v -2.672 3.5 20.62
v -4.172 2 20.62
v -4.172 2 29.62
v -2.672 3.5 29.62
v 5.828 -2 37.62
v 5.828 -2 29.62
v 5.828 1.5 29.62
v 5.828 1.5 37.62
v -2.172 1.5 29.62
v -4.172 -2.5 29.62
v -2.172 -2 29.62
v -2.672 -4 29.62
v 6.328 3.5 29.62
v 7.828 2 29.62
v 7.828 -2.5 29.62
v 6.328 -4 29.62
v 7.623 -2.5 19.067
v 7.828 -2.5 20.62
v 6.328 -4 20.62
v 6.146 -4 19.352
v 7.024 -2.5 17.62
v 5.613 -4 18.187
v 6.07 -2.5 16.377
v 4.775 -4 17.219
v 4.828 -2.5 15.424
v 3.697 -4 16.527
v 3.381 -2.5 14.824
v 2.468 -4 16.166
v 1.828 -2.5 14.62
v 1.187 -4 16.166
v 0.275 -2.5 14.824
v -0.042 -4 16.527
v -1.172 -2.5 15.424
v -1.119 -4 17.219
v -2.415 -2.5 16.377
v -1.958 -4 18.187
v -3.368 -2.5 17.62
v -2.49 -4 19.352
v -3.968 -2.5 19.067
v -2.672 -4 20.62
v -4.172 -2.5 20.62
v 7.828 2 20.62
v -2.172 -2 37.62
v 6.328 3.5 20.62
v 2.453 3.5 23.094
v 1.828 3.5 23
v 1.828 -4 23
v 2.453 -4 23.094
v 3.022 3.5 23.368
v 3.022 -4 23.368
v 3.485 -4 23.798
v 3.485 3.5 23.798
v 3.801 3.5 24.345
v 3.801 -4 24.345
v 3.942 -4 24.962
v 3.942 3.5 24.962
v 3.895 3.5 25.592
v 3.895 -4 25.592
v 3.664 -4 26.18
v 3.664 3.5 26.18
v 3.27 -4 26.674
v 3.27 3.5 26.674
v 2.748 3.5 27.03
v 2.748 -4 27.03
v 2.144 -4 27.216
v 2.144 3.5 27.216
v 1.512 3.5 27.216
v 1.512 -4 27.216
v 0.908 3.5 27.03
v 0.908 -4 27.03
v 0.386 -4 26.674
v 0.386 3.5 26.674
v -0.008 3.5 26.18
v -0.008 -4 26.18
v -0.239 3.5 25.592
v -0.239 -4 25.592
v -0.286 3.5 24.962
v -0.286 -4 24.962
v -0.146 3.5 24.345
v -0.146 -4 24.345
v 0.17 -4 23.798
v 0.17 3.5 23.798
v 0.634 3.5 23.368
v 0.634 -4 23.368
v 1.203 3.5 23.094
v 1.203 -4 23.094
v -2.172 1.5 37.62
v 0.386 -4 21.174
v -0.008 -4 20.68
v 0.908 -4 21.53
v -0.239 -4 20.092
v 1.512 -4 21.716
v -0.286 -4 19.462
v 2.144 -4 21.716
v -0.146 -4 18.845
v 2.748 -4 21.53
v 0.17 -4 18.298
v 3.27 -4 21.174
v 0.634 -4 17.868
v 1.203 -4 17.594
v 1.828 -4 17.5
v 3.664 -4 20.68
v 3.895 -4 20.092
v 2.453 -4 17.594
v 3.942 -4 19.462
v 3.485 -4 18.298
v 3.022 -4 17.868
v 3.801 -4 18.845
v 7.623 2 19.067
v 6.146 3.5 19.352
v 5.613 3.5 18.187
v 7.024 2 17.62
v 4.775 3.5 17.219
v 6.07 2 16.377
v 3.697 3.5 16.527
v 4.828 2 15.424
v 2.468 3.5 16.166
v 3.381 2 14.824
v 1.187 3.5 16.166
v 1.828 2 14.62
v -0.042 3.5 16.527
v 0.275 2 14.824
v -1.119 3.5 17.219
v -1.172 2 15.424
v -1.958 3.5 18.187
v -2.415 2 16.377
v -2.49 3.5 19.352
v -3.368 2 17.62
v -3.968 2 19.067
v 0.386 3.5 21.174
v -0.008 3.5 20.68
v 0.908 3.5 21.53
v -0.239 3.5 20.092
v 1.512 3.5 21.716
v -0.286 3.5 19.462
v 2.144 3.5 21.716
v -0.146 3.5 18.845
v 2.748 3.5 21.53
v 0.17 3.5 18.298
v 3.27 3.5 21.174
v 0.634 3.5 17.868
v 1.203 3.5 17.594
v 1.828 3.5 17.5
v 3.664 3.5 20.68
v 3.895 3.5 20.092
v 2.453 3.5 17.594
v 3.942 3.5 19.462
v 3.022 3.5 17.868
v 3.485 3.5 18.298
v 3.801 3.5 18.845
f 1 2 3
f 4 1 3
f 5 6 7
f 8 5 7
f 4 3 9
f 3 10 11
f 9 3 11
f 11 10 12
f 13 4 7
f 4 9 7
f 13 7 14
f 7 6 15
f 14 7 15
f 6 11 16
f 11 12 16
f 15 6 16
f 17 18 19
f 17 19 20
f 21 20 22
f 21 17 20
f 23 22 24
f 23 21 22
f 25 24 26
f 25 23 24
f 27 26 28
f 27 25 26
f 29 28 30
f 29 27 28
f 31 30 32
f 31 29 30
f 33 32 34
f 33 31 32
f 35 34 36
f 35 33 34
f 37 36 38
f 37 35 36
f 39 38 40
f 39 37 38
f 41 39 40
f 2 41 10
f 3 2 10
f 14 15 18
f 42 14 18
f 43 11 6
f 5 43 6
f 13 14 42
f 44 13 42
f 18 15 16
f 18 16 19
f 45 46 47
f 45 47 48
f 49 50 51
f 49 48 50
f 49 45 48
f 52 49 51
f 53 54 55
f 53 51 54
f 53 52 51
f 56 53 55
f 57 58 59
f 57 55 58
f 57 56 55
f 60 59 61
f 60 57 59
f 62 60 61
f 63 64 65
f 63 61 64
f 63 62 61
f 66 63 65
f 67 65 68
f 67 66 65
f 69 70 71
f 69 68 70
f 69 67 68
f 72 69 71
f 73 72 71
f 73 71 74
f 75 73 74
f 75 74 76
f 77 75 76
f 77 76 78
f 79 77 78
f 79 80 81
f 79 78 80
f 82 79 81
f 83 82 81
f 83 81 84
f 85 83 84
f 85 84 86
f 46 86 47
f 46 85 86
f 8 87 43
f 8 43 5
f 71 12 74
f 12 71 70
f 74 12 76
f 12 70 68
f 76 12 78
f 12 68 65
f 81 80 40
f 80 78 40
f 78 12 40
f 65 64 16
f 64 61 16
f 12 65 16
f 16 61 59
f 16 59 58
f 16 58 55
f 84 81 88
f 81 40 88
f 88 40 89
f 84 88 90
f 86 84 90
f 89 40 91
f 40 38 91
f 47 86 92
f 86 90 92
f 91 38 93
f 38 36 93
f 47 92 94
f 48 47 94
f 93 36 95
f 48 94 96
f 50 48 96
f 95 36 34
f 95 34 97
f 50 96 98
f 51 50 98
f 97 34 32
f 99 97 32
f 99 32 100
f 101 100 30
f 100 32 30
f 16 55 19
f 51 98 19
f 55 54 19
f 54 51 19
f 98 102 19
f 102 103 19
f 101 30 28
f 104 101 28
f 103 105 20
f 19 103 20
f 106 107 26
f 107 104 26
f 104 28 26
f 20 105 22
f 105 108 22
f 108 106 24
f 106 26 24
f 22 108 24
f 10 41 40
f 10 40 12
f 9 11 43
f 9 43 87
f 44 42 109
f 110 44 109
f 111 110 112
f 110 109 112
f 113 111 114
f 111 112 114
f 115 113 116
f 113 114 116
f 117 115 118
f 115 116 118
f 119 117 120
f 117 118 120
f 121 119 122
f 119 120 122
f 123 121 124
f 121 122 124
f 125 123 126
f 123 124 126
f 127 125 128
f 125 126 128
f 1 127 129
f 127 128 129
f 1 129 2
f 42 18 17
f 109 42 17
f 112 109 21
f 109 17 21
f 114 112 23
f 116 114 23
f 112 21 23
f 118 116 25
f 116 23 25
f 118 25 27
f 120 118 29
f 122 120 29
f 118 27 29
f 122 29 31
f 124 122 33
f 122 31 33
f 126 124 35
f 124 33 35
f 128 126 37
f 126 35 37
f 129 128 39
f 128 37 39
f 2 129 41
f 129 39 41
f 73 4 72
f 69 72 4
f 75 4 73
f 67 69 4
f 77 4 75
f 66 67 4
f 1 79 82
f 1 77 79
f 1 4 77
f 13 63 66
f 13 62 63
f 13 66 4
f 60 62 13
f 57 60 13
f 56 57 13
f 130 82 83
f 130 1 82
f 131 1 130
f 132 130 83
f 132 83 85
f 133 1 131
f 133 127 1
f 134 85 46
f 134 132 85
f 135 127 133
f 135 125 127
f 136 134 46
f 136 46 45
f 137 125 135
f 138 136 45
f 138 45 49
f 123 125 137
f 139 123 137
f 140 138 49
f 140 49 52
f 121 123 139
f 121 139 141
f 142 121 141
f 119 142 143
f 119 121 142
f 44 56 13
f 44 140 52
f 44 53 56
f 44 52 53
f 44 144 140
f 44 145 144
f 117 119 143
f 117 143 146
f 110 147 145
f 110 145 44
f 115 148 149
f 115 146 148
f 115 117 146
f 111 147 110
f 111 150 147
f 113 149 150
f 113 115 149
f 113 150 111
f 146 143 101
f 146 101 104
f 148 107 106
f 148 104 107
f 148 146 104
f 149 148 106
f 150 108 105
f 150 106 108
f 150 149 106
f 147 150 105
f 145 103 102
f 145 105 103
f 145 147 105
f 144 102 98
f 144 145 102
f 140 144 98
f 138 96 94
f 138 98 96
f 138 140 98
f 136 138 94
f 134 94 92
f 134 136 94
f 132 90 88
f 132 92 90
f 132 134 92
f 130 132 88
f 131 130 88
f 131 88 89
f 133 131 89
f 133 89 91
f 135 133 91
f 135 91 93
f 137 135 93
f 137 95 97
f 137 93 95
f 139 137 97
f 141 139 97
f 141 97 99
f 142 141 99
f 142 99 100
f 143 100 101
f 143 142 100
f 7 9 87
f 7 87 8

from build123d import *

# Parameters (mm, degrees)
BOSS_EXTRUDE9_DEPTH      = 3.5
BOSS_EXTRUDE9_DEPTH_BACK = 4
SKETCH16_W               = 8
SKETCH16_H               = 3.5
BOSS_EXTRUDE11_DEPTH     = 8
CHAMFER2_SIZE            = 1.5
CUT_EXTRUDE1_DEPTH       = 40.150823276
CUT_EXTRUDE1_DEPTH_BACK  = 40.150823276
SKETCH17_R               = 2.12


with BuildPart() as part:
    # Sketch14 → Boss-Extrude9 (new, two sides: drawn at the far end of the back side and taken through both)
    with BuildSketch(Plane(origin=(0, 0, 0), x_dir=(1, 0, 0), z_dir=(0, 1, 0)).offset(-BOSS_EXTRUDE9_DEPTH_BACK)):
        with BuildLine():
            Line((-4.172171186, -29.619968889), (7.827828814, -29.619968889))
            Line((7.827828814, -29.619968889), (7.827828814, -20.619968889))
            ThreePointArc((7.827828814, -20.619968889), (1.827828814, -14.619968889), (-4.172171186, -20.619968889))
            Line((-4.172171186, -20.619968889), (-4.172171186, -29.619968889))
        make_face()
    extrude(amount=BOSS_EXTRUDE9_DEPTH + BOSS_EXTRUDE9_DEPTH_BACK)

    # Sketch16 → Boss-Extrude11 (add)
    with BuildSketch(Plane.XY.offset(29.619968889)):
        with Locations((1.827828814, -0.25)):
            Rectangle(SKETCH16_W, SKETCH16_H)
    extrude(amount=BOSS_EXTRUDE11_DEPTH)

    # Chamfer2
    chamfer2_edges = [part.edges().sort_by_distance(p)[0] for p in [
        (1.827828814, -4, 14.619968889),
        (7.827828814, 3.5, 25.119968889),
        (1.827828814, 3.5, 14.619968889),
        (-4.172171186, -4, 25.119968889),
        (-4.172171186, 3.5, 25.119968889),
        (7.827828814, -4, 25.119968889),
    ]]
    chamfer(chamfer2_edges, length=CHAMFER2_SIZE)

    # Sketch17 → Cut-Extrude1 (cut, two sides: drawn at the far end of the back side and taken through both)
    with BuildSketch(Plane.XZ.offset(4).offset(-CUT_EXTRUDE1_DEPTH_BACK)):
        with Locations(Location((1.827828814, 25.119968889, 0), (0, 0, 270))):
            Circle(SKETCH17_R)
        with Locations(Location((1.827828814, 19.619968889, 0), (0, 0, 270))):
            Circle(SKETCH17_R)
    extrude(amount=CUT_EXTRUDE1_DEPTH + CUT_EXTRUDE1_DEPTH_BACK, mode=Mode.SUBTRACT)


solid = part.part
